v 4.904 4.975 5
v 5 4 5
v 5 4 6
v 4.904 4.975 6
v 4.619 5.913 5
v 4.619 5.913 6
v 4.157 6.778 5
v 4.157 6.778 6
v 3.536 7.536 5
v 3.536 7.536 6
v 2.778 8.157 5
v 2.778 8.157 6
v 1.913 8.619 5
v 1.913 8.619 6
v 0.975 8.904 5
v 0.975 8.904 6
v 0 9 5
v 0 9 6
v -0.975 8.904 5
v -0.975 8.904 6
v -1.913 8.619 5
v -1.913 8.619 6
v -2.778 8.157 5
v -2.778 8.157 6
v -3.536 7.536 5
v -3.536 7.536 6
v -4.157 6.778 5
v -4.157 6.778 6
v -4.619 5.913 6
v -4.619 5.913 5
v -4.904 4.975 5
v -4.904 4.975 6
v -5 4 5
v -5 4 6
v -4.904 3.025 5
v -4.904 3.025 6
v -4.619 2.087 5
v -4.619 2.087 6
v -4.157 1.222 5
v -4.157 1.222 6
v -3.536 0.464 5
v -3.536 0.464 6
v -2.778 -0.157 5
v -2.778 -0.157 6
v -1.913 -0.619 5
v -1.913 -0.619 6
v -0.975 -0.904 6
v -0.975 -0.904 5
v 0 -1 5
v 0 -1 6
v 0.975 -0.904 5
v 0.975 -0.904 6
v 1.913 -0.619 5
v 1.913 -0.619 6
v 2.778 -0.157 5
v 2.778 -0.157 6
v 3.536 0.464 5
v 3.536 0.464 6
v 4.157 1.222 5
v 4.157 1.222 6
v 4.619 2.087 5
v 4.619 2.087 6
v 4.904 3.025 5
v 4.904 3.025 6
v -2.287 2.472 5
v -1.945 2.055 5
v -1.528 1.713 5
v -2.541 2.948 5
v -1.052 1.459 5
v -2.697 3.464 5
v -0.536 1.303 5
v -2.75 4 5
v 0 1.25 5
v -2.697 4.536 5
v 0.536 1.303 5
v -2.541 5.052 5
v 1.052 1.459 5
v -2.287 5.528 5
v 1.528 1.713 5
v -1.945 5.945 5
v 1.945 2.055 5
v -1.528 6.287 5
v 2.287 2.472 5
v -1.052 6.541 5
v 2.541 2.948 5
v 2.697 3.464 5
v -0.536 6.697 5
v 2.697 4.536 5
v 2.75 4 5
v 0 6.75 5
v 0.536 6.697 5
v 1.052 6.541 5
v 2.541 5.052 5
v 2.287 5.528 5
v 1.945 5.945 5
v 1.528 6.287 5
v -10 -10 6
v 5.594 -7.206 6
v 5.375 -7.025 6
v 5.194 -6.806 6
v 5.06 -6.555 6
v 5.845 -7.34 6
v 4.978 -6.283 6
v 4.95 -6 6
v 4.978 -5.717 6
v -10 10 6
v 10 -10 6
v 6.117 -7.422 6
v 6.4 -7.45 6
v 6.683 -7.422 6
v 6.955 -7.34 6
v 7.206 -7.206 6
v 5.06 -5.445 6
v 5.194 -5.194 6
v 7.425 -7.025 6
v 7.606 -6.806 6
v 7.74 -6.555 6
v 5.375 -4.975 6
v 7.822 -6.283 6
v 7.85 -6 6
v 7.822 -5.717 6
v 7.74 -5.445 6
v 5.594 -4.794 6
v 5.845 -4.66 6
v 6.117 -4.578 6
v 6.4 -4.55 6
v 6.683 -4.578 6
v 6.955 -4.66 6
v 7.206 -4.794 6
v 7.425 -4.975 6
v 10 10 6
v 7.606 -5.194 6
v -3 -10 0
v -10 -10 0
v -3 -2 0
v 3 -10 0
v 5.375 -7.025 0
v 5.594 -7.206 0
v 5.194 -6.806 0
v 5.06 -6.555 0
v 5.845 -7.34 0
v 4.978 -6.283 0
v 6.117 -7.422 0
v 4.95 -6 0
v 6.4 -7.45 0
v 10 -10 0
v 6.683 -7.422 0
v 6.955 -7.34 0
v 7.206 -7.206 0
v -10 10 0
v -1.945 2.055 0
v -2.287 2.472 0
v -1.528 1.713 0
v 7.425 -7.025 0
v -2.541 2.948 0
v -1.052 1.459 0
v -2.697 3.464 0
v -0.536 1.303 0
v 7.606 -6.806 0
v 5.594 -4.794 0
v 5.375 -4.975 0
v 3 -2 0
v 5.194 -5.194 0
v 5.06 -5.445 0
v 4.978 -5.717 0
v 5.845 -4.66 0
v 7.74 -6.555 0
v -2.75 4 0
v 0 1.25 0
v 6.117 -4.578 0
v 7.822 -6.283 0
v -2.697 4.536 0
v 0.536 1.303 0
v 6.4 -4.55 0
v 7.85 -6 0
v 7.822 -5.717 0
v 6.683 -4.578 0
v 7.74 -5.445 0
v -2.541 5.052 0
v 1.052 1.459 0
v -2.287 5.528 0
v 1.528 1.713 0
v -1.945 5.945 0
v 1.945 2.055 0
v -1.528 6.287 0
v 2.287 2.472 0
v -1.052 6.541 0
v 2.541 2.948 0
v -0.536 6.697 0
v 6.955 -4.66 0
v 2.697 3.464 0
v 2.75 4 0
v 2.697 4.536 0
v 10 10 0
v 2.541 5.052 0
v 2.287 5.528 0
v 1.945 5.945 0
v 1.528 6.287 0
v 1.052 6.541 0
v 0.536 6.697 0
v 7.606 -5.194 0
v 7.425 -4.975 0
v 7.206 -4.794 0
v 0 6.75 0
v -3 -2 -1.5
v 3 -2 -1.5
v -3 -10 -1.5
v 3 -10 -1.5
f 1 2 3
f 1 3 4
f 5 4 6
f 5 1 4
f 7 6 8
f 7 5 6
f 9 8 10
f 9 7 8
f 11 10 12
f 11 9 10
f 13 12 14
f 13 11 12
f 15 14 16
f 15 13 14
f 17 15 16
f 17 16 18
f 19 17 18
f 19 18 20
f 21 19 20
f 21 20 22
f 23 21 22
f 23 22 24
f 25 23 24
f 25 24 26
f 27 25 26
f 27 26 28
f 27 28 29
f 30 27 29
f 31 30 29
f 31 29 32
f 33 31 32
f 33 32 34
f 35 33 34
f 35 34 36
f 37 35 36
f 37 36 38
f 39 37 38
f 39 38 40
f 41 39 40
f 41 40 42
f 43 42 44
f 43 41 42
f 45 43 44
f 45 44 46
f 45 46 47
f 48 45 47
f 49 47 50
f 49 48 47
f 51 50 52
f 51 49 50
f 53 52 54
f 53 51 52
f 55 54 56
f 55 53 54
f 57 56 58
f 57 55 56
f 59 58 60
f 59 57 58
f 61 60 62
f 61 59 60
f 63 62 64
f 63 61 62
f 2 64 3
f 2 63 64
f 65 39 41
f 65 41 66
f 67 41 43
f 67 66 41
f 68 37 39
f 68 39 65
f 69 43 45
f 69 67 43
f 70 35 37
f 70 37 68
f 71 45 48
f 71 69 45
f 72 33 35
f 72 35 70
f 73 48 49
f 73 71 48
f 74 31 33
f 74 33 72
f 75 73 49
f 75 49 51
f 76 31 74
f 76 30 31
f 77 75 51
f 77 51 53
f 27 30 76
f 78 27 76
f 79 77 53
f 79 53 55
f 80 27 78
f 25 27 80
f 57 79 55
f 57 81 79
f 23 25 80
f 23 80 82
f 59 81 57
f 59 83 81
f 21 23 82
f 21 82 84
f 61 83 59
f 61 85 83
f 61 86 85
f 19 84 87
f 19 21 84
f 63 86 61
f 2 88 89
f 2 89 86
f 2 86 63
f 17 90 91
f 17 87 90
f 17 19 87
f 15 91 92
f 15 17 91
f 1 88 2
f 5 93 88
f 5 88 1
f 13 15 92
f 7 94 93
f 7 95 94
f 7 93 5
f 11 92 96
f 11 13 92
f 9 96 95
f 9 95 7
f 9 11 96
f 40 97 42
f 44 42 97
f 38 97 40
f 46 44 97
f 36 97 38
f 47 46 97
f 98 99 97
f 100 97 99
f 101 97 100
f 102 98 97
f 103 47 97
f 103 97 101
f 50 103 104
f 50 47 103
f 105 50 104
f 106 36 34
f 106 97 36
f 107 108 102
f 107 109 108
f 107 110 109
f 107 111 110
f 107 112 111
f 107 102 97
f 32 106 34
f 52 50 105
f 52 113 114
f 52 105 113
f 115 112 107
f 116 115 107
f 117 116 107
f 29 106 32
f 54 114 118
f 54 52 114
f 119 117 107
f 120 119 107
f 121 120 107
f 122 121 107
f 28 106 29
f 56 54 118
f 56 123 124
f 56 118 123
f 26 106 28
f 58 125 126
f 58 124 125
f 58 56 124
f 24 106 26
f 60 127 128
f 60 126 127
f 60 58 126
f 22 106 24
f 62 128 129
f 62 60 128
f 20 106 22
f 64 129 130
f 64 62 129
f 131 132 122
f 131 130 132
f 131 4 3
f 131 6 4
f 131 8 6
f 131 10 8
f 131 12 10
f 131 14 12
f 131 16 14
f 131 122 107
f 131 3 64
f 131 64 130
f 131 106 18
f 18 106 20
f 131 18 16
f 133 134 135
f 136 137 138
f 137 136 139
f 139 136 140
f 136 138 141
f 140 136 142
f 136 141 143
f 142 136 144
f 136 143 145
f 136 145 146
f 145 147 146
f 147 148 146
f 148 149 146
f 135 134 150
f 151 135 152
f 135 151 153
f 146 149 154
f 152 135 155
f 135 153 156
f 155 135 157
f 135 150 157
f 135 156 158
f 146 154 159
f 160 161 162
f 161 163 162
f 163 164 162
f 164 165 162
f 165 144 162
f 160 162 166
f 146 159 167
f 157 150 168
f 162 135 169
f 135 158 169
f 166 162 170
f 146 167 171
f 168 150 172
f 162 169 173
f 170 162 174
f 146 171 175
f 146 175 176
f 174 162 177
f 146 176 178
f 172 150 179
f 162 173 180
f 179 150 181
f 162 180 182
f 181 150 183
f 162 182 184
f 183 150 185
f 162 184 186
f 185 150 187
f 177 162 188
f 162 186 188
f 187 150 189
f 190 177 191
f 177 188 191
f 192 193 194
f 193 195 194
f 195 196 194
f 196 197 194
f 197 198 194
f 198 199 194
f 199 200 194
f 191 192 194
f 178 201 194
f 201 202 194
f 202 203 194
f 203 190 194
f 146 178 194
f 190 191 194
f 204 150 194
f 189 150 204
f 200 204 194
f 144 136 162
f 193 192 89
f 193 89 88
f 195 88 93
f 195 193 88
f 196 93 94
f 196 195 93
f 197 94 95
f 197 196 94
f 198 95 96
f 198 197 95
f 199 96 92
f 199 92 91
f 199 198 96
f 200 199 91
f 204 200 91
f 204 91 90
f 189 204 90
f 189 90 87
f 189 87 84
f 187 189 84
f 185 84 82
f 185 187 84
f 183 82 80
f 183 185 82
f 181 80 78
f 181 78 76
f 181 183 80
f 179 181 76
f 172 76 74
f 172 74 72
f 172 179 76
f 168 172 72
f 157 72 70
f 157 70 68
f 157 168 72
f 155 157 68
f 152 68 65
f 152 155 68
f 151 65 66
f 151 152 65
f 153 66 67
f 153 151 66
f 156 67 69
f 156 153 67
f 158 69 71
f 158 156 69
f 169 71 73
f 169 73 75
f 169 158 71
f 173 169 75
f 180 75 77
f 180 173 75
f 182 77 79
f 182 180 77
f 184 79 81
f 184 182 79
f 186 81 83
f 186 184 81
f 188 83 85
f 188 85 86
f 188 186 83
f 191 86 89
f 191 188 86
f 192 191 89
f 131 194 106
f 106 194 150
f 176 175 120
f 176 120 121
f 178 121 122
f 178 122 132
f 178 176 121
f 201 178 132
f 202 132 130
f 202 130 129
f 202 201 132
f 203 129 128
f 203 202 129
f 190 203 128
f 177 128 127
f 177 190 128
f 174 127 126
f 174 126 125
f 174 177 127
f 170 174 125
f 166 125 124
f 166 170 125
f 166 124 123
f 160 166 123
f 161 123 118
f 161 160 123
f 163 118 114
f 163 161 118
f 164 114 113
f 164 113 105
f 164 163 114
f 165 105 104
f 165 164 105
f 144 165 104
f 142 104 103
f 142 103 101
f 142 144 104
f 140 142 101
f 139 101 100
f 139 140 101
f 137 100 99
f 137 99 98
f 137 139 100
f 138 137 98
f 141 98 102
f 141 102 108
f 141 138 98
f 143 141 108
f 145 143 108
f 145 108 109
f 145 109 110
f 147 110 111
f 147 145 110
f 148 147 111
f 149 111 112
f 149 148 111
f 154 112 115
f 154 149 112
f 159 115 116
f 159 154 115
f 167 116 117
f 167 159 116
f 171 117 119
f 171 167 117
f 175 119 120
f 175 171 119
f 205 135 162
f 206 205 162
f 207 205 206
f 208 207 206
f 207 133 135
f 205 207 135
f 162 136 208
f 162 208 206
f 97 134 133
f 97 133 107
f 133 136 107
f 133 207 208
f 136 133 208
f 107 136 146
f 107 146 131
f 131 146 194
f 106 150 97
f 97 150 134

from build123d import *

# Parameters (mm, degrees)
F0_R     = 1.45
F0_R_2   = 5
F0_W     = 6
F0_H     = 8
F1_DEPTH = 6
F2_DEPTH = 1.5
F0_R_3   = 2.75
F3_DEPTH = 5


with BuildPart() as f1:
    # F0 (on Top) → F1 (new body)
    with BuildSketch(Plane.XY):
        Polygon((3, -10), (10, -10), (10, 10), (-10, 10), (-10, -10), (-3, -10), (-3, -2), (3, -2), align=None)
        with Locations((6.4, -6)):
            Circle(F0_R, mode=Mode.SUBTRACT)
        with Locations((0, 4)):
            Circle(F0_R_2, mode=Mode.SUBTRACT)
        with Locations((0, -6)):
            Rectangle(F0_W, F0_H)
    extrude(amount=F1_DEPTH)

    # F0 (on Top) → F2 (join)
    with BuildSketch(Plane.XY):
        with Locations((0, -6)):
            Rectangle(F0_W, F0_H)
    extrude(amount=-F2_DEPTH)

    # F0 (on Top) → F3 (join)
    with BuildSketch(Plane.XY):
        with Locations((0, 4)):
            Circle(F0_R_2)
        with Locations((0, 4)):
            Circle(F0_R_3, mode=Mode.SUBTRACT)
    extrude(amount=F3_DEPTH)


solid = f1.part
